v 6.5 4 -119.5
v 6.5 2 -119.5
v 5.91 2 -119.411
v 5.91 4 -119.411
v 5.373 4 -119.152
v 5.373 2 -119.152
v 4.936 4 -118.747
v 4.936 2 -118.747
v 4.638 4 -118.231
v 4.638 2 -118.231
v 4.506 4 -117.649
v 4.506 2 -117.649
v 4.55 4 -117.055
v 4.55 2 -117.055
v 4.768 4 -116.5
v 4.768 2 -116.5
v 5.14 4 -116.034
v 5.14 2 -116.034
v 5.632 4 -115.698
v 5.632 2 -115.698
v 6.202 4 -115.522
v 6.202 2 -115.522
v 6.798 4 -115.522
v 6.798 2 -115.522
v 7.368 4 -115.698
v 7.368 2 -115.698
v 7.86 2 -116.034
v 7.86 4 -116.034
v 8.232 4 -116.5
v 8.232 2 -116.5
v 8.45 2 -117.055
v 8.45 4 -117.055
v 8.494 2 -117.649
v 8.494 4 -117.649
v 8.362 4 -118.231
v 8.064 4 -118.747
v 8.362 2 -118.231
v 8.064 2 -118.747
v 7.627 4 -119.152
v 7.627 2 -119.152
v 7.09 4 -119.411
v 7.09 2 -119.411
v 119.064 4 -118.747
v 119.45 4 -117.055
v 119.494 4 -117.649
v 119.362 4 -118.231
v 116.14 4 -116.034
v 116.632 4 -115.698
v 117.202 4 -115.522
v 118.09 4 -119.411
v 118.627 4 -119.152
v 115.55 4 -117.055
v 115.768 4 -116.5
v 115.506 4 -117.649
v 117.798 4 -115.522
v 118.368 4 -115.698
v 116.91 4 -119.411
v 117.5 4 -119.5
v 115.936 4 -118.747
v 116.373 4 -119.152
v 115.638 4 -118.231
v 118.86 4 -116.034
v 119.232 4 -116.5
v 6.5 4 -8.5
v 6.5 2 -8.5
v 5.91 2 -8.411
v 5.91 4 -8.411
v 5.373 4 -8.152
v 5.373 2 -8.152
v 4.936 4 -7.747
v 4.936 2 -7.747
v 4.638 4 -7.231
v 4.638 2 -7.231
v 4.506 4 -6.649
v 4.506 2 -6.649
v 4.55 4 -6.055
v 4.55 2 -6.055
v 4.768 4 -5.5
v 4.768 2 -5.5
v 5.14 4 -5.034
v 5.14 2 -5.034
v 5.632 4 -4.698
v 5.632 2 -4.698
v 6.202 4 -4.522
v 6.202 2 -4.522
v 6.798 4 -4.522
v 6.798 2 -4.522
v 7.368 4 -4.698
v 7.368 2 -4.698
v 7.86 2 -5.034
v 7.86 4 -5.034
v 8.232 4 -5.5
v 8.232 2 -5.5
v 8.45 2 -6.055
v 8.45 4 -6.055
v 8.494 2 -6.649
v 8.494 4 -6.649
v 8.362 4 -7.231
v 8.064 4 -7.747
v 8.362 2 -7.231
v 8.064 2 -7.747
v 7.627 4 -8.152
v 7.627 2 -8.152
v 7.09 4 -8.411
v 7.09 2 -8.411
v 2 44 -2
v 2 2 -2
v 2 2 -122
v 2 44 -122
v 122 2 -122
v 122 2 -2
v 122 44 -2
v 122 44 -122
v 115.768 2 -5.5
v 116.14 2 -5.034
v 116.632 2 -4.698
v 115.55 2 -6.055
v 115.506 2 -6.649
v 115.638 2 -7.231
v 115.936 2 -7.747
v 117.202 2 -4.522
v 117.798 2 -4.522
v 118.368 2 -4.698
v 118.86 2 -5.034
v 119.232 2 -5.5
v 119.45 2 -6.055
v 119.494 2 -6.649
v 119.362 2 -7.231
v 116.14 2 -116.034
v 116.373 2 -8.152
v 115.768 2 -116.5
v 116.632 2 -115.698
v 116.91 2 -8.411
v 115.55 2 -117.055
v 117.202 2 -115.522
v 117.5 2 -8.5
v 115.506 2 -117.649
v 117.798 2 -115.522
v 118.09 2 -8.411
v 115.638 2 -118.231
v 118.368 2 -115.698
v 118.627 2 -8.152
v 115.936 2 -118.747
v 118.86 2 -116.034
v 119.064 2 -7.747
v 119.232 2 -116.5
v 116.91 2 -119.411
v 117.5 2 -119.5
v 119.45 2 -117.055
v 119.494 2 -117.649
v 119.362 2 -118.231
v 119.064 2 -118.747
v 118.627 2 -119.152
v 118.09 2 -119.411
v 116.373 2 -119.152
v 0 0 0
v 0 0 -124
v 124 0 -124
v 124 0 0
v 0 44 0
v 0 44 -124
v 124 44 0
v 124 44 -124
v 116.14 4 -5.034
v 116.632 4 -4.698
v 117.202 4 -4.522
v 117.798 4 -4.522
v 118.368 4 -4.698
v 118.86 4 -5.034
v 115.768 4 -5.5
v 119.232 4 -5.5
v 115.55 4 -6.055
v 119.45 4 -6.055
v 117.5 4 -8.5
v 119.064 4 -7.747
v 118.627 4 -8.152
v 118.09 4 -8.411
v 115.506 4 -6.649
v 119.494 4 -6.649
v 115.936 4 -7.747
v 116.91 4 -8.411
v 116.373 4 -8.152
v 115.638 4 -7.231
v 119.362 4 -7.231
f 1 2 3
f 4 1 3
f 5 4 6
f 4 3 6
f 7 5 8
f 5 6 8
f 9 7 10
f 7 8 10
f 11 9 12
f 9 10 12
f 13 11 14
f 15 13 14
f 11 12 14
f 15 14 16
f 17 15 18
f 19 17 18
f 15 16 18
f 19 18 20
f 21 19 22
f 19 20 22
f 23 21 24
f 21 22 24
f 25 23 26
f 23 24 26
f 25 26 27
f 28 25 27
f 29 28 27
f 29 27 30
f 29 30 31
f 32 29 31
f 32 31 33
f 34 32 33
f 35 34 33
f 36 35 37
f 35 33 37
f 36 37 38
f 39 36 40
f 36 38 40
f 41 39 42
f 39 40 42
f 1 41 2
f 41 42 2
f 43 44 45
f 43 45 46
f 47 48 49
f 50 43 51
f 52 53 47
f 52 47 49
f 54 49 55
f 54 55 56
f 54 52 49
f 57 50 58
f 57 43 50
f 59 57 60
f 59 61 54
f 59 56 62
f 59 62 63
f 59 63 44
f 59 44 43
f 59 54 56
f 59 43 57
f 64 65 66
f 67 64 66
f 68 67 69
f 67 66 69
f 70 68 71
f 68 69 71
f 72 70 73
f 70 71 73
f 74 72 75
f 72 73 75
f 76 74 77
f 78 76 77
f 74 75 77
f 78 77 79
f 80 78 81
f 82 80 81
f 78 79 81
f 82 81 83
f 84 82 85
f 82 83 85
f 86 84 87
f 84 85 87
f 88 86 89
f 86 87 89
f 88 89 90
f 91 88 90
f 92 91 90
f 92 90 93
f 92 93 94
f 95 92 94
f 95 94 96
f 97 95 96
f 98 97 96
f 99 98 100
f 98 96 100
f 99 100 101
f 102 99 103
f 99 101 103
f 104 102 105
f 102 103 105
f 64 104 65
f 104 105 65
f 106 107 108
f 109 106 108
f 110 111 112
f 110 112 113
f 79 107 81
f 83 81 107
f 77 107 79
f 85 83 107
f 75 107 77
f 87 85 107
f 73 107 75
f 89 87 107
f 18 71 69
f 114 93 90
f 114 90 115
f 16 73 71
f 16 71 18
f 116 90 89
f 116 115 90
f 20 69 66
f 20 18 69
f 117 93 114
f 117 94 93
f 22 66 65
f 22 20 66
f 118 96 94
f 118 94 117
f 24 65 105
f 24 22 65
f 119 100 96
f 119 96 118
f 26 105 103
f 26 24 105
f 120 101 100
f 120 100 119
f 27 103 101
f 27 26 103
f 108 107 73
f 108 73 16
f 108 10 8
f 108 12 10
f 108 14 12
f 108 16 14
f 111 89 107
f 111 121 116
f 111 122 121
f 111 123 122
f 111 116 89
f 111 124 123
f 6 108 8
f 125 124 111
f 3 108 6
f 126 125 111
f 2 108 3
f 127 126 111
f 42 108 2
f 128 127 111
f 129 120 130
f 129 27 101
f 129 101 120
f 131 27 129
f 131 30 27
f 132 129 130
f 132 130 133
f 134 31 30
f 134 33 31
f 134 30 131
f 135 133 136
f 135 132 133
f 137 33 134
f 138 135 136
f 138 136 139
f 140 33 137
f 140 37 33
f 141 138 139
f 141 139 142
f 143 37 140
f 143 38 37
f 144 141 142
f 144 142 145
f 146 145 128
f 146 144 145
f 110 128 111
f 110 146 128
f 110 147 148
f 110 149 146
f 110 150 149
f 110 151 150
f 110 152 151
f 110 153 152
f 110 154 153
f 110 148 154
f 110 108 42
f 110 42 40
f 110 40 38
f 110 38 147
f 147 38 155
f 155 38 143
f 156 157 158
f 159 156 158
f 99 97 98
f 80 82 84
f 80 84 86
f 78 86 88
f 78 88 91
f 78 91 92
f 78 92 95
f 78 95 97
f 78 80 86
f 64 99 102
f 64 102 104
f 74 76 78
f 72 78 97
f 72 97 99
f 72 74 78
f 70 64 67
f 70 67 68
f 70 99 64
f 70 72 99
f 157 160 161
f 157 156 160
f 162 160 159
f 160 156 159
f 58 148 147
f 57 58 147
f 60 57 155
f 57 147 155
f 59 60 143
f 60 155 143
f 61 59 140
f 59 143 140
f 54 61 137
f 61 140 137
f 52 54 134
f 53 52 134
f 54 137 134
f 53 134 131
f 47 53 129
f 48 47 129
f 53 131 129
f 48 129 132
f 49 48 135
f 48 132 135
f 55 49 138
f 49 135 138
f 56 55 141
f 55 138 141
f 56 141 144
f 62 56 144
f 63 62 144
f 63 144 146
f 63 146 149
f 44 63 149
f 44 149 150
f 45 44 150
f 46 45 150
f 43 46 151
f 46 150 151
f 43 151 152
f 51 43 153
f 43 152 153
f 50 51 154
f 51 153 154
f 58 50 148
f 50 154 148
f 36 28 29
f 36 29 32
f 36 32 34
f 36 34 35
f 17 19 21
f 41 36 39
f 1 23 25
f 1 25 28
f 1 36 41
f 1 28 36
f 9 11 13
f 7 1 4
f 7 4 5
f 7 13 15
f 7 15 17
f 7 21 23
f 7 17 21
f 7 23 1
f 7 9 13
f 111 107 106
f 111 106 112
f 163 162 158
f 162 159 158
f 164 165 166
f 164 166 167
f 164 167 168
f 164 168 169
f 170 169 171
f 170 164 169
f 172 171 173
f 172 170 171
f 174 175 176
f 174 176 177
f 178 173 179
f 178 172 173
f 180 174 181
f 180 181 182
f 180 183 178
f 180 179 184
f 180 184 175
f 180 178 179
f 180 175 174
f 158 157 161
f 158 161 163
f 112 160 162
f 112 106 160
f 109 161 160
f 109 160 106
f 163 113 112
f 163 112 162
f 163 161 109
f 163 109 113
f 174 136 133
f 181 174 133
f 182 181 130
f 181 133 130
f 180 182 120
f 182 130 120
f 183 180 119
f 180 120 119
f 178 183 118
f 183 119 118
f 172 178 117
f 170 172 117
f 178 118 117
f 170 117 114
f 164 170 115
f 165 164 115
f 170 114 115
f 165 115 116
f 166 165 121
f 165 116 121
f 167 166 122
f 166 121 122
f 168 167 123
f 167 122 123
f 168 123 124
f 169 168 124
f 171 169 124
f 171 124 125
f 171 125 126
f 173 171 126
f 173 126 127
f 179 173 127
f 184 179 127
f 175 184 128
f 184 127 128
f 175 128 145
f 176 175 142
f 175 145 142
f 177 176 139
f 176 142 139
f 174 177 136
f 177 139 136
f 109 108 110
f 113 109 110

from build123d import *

# Parameters (mm, degrees)
SKETCH_2_W      = 124
SKETCH_2_H      = 124
EXTRUDE_1_DEPTH = 2
SKETCH_6_W      = 124
SKETCH_6_H      = 124
SKETCH_6_W_2    = 120
SKETCH_6_H_2    = 120
EXTRUDE_3_DEPTH = 42
SKETCH_7_R      = 2
EXTRUDE_4_DEPTH = 2


with BuildPart() as part:
    # 草图2 → 凸台-拉伸1 (new body)
    with BuildSketch(Plane(origin=(0, 0, 0), x_dir=(1, 0, 0), z_dir=(0, 1, 0))):
        with Locations((62, 62)):
            Rectangle(SKETCH_2_W, SKETCH_2_H)
    extrude(amount=EXTRUDE_1_DEPTH)

    # 草图6 → 凸台-拉伸3 (add)
    with BuildSketch(Plane(origin=(0, 2, 0), x_dir=(1, 0, 0), z_dir=(0, 1, 0))):
        with Locations((62, 62)):
            Rectangle(SKETCH_6_W, SKETCH_6_H)
        with Locations((62, 62)):
            Rectangle(SKETCH_6_W_2, SKETCH_6_H_2, mode=Mode.SUBTRACT)
    extrude(amount=EXTRUDE_3_DEPTH)

    # 草图7 → 凸台-拉伸4 (add)
    with BuildSketch(Plane(origin=(0, 2, 0), x_dir=(1, 0, 0), z_dir=(0, 1, 0))):
        with Locations(Location((6.5, 6.5, 0), (0, 0, 90))):
            Circle(SKETCH_7_R)
        with Locations(Location((117.5, 6.5, 0), (0, 0, 90))):
            Circle(SKETCH_7_R)
        with Locations(Location((6.5, 117.5, 0), (0, 0, 90))):
            Circle(SKETCH_7_R)
        with Locations(Location((117.5, 117.5, 0), (0, 0, 90))):
            Circle(SKETCH_7_R)
    extrude(amount=EXTRUDE_4_DEPTH)


solid = part.part
